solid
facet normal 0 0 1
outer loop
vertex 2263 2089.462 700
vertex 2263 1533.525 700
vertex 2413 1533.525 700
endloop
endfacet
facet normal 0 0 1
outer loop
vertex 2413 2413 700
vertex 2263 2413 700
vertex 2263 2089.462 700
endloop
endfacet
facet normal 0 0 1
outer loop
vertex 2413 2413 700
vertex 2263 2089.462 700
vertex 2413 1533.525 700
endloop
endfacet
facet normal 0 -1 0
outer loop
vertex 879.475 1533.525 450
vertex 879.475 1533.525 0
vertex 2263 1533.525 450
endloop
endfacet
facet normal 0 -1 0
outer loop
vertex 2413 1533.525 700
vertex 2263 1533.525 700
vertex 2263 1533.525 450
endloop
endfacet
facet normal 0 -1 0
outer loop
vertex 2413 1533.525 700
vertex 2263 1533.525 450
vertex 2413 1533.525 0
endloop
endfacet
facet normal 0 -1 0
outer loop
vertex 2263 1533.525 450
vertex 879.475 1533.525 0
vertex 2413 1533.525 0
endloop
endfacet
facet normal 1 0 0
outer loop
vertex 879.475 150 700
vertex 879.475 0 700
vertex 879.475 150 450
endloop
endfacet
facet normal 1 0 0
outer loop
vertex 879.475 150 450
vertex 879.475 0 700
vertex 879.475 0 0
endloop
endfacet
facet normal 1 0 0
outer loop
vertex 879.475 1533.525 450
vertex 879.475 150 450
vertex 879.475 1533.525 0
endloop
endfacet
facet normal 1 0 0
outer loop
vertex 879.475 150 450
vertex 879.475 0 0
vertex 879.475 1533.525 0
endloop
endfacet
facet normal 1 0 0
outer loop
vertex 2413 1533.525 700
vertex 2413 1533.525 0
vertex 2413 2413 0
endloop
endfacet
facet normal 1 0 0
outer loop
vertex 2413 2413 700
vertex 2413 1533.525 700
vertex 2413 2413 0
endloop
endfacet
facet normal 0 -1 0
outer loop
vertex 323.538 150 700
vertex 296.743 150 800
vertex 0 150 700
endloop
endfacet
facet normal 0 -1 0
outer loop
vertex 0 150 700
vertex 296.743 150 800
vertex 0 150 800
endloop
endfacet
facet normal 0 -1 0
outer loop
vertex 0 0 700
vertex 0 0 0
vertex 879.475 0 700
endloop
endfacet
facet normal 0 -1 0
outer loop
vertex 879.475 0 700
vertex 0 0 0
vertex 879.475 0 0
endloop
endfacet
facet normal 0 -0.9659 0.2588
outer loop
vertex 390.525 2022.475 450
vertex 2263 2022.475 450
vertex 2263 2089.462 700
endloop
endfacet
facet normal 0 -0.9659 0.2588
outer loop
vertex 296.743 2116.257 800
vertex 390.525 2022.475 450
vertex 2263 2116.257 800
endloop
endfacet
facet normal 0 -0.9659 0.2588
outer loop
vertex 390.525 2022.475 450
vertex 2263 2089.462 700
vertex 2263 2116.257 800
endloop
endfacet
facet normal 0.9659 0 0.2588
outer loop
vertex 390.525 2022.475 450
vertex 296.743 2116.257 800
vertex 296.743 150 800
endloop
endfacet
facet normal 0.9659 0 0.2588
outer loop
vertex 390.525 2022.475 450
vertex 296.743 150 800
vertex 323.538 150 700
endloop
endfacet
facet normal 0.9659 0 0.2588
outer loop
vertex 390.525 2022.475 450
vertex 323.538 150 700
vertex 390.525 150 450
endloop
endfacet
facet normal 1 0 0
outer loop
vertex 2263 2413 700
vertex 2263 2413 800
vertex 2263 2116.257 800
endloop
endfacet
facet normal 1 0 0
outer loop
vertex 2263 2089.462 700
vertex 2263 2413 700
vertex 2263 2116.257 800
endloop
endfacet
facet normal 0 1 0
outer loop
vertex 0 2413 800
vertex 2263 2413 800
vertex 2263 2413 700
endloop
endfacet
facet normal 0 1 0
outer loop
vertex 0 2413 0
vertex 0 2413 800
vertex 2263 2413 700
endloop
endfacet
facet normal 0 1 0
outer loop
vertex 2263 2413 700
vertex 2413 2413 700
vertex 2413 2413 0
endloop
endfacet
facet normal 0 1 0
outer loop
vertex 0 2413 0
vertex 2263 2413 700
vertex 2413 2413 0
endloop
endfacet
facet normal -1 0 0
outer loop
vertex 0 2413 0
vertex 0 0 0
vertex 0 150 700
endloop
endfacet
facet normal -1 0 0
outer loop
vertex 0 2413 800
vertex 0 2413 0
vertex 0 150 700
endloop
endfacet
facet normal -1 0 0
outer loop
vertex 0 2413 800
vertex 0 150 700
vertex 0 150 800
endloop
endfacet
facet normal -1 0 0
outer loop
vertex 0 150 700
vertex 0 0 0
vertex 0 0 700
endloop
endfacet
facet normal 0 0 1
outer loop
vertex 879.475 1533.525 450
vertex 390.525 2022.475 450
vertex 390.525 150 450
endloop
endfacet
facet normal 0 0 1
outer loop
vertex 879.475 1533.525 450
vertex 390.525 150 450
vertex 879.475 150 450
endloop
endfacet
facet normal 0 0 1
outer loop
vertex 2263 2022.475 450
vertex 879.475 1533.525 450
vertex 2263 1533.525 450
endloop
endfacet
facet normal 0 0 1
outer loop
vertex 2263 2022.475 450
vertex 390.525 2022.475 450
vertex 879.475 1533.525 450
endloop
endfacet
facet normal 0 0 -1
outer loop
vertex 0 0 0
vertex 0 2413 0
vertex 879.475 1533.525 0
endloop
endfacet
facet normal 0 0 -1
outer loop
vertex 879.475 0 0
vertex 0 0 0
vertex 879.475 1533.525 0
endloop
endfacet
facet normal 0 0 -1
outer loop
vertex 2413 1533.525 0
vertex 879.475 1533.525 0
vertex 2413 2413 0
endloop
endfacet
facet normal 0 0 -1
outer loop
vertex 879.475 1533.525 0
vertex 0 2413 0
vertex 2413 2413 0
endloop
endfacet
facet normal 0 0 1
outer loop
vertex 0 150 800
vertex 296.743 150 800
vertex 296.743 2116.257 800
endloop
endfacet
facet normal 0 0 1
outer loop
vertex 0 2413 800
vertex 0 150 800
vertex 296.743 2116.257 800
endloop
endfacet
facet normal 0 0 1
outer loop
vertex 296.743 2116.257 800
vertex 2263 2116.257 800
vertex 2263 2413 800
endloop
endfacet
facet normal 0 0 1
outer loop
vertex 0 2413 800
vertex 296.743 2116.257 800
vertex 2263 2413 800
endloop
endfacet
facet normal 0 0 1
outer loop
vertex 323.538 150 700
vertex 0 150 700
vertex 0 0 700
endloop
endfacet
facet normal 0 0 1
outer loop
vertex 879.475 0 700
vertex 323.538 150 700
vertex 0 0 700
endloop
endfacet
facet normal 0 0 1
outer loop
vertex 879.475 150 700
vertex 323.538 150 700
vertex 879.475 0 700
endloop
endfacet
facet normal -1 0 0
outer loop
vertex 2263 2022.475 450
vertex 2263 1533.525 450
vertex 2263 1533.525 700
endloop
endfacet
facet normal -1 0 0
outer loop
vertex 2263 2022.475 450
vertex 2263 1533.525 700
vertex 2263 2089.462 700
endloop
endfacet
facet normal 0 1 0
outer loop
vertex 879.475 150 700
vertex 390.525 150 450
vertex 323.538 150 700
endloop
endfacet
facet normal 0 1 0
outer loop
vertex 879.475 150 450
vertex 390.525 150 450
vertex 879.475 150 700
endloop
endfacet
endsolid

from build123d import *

# Parameters (mm, degrees)
F1_DEPTH = 450
F2_W     = 879.475
F2_H     = 150
F2_W_2   = 150
F2_H_2   = 879.475
F3_DEPTH = 250
F5_DEPTH = 2263


with BuildPart() as f1:
    # F0 (on Top) → F1 (new body)
    with BuildSketch(Plane.XY):
        Polygon((0, 2413), (0, 0), (879.475, 0), (879.475, 1533.525), (2413, 1533.525), (2413, 2413), align=None)
    extrude(amount=F1_DEPTH)

    # F2 (on face) → F3 (join)
    with BuildSketch(Plane.XY.offset(450)):
        with Locations((439.7375, 75)):
            Rectangle(F2_W, F2_H)
        with Locations((2338, 1973.2625)):
            Rectangle(F2_W_2, F2_H_2)
    extrude(amount=F3_DEPTH)

    # F4 (on face) → F5 (join, through all)
    with BuildSketch(Plane(origin=(0, 150, 0), x_dir=(-1, 0, 0), z_dir=(0, 1, 0))):
        Polygon((-390.525, 450), (0, 450), (0, 800), (-296.7427826491, 800), align=None)
    extrude(amount=F5_DEPTH)

    # F6 (on face) → F7 (join, up to the next surface of F1)
    with BuildSketch(Plane(origin=(2263, 0, 0), x_dir=(0, -1, 0), z_dir=(-1, 0, 0))):
        Polygon((-2413, 800), (-2413, 450), (-2022.475, 450), (-2116.2572173509, 800), align=None)
    extrude(until=Until.NEXT)


solid = f1.part
